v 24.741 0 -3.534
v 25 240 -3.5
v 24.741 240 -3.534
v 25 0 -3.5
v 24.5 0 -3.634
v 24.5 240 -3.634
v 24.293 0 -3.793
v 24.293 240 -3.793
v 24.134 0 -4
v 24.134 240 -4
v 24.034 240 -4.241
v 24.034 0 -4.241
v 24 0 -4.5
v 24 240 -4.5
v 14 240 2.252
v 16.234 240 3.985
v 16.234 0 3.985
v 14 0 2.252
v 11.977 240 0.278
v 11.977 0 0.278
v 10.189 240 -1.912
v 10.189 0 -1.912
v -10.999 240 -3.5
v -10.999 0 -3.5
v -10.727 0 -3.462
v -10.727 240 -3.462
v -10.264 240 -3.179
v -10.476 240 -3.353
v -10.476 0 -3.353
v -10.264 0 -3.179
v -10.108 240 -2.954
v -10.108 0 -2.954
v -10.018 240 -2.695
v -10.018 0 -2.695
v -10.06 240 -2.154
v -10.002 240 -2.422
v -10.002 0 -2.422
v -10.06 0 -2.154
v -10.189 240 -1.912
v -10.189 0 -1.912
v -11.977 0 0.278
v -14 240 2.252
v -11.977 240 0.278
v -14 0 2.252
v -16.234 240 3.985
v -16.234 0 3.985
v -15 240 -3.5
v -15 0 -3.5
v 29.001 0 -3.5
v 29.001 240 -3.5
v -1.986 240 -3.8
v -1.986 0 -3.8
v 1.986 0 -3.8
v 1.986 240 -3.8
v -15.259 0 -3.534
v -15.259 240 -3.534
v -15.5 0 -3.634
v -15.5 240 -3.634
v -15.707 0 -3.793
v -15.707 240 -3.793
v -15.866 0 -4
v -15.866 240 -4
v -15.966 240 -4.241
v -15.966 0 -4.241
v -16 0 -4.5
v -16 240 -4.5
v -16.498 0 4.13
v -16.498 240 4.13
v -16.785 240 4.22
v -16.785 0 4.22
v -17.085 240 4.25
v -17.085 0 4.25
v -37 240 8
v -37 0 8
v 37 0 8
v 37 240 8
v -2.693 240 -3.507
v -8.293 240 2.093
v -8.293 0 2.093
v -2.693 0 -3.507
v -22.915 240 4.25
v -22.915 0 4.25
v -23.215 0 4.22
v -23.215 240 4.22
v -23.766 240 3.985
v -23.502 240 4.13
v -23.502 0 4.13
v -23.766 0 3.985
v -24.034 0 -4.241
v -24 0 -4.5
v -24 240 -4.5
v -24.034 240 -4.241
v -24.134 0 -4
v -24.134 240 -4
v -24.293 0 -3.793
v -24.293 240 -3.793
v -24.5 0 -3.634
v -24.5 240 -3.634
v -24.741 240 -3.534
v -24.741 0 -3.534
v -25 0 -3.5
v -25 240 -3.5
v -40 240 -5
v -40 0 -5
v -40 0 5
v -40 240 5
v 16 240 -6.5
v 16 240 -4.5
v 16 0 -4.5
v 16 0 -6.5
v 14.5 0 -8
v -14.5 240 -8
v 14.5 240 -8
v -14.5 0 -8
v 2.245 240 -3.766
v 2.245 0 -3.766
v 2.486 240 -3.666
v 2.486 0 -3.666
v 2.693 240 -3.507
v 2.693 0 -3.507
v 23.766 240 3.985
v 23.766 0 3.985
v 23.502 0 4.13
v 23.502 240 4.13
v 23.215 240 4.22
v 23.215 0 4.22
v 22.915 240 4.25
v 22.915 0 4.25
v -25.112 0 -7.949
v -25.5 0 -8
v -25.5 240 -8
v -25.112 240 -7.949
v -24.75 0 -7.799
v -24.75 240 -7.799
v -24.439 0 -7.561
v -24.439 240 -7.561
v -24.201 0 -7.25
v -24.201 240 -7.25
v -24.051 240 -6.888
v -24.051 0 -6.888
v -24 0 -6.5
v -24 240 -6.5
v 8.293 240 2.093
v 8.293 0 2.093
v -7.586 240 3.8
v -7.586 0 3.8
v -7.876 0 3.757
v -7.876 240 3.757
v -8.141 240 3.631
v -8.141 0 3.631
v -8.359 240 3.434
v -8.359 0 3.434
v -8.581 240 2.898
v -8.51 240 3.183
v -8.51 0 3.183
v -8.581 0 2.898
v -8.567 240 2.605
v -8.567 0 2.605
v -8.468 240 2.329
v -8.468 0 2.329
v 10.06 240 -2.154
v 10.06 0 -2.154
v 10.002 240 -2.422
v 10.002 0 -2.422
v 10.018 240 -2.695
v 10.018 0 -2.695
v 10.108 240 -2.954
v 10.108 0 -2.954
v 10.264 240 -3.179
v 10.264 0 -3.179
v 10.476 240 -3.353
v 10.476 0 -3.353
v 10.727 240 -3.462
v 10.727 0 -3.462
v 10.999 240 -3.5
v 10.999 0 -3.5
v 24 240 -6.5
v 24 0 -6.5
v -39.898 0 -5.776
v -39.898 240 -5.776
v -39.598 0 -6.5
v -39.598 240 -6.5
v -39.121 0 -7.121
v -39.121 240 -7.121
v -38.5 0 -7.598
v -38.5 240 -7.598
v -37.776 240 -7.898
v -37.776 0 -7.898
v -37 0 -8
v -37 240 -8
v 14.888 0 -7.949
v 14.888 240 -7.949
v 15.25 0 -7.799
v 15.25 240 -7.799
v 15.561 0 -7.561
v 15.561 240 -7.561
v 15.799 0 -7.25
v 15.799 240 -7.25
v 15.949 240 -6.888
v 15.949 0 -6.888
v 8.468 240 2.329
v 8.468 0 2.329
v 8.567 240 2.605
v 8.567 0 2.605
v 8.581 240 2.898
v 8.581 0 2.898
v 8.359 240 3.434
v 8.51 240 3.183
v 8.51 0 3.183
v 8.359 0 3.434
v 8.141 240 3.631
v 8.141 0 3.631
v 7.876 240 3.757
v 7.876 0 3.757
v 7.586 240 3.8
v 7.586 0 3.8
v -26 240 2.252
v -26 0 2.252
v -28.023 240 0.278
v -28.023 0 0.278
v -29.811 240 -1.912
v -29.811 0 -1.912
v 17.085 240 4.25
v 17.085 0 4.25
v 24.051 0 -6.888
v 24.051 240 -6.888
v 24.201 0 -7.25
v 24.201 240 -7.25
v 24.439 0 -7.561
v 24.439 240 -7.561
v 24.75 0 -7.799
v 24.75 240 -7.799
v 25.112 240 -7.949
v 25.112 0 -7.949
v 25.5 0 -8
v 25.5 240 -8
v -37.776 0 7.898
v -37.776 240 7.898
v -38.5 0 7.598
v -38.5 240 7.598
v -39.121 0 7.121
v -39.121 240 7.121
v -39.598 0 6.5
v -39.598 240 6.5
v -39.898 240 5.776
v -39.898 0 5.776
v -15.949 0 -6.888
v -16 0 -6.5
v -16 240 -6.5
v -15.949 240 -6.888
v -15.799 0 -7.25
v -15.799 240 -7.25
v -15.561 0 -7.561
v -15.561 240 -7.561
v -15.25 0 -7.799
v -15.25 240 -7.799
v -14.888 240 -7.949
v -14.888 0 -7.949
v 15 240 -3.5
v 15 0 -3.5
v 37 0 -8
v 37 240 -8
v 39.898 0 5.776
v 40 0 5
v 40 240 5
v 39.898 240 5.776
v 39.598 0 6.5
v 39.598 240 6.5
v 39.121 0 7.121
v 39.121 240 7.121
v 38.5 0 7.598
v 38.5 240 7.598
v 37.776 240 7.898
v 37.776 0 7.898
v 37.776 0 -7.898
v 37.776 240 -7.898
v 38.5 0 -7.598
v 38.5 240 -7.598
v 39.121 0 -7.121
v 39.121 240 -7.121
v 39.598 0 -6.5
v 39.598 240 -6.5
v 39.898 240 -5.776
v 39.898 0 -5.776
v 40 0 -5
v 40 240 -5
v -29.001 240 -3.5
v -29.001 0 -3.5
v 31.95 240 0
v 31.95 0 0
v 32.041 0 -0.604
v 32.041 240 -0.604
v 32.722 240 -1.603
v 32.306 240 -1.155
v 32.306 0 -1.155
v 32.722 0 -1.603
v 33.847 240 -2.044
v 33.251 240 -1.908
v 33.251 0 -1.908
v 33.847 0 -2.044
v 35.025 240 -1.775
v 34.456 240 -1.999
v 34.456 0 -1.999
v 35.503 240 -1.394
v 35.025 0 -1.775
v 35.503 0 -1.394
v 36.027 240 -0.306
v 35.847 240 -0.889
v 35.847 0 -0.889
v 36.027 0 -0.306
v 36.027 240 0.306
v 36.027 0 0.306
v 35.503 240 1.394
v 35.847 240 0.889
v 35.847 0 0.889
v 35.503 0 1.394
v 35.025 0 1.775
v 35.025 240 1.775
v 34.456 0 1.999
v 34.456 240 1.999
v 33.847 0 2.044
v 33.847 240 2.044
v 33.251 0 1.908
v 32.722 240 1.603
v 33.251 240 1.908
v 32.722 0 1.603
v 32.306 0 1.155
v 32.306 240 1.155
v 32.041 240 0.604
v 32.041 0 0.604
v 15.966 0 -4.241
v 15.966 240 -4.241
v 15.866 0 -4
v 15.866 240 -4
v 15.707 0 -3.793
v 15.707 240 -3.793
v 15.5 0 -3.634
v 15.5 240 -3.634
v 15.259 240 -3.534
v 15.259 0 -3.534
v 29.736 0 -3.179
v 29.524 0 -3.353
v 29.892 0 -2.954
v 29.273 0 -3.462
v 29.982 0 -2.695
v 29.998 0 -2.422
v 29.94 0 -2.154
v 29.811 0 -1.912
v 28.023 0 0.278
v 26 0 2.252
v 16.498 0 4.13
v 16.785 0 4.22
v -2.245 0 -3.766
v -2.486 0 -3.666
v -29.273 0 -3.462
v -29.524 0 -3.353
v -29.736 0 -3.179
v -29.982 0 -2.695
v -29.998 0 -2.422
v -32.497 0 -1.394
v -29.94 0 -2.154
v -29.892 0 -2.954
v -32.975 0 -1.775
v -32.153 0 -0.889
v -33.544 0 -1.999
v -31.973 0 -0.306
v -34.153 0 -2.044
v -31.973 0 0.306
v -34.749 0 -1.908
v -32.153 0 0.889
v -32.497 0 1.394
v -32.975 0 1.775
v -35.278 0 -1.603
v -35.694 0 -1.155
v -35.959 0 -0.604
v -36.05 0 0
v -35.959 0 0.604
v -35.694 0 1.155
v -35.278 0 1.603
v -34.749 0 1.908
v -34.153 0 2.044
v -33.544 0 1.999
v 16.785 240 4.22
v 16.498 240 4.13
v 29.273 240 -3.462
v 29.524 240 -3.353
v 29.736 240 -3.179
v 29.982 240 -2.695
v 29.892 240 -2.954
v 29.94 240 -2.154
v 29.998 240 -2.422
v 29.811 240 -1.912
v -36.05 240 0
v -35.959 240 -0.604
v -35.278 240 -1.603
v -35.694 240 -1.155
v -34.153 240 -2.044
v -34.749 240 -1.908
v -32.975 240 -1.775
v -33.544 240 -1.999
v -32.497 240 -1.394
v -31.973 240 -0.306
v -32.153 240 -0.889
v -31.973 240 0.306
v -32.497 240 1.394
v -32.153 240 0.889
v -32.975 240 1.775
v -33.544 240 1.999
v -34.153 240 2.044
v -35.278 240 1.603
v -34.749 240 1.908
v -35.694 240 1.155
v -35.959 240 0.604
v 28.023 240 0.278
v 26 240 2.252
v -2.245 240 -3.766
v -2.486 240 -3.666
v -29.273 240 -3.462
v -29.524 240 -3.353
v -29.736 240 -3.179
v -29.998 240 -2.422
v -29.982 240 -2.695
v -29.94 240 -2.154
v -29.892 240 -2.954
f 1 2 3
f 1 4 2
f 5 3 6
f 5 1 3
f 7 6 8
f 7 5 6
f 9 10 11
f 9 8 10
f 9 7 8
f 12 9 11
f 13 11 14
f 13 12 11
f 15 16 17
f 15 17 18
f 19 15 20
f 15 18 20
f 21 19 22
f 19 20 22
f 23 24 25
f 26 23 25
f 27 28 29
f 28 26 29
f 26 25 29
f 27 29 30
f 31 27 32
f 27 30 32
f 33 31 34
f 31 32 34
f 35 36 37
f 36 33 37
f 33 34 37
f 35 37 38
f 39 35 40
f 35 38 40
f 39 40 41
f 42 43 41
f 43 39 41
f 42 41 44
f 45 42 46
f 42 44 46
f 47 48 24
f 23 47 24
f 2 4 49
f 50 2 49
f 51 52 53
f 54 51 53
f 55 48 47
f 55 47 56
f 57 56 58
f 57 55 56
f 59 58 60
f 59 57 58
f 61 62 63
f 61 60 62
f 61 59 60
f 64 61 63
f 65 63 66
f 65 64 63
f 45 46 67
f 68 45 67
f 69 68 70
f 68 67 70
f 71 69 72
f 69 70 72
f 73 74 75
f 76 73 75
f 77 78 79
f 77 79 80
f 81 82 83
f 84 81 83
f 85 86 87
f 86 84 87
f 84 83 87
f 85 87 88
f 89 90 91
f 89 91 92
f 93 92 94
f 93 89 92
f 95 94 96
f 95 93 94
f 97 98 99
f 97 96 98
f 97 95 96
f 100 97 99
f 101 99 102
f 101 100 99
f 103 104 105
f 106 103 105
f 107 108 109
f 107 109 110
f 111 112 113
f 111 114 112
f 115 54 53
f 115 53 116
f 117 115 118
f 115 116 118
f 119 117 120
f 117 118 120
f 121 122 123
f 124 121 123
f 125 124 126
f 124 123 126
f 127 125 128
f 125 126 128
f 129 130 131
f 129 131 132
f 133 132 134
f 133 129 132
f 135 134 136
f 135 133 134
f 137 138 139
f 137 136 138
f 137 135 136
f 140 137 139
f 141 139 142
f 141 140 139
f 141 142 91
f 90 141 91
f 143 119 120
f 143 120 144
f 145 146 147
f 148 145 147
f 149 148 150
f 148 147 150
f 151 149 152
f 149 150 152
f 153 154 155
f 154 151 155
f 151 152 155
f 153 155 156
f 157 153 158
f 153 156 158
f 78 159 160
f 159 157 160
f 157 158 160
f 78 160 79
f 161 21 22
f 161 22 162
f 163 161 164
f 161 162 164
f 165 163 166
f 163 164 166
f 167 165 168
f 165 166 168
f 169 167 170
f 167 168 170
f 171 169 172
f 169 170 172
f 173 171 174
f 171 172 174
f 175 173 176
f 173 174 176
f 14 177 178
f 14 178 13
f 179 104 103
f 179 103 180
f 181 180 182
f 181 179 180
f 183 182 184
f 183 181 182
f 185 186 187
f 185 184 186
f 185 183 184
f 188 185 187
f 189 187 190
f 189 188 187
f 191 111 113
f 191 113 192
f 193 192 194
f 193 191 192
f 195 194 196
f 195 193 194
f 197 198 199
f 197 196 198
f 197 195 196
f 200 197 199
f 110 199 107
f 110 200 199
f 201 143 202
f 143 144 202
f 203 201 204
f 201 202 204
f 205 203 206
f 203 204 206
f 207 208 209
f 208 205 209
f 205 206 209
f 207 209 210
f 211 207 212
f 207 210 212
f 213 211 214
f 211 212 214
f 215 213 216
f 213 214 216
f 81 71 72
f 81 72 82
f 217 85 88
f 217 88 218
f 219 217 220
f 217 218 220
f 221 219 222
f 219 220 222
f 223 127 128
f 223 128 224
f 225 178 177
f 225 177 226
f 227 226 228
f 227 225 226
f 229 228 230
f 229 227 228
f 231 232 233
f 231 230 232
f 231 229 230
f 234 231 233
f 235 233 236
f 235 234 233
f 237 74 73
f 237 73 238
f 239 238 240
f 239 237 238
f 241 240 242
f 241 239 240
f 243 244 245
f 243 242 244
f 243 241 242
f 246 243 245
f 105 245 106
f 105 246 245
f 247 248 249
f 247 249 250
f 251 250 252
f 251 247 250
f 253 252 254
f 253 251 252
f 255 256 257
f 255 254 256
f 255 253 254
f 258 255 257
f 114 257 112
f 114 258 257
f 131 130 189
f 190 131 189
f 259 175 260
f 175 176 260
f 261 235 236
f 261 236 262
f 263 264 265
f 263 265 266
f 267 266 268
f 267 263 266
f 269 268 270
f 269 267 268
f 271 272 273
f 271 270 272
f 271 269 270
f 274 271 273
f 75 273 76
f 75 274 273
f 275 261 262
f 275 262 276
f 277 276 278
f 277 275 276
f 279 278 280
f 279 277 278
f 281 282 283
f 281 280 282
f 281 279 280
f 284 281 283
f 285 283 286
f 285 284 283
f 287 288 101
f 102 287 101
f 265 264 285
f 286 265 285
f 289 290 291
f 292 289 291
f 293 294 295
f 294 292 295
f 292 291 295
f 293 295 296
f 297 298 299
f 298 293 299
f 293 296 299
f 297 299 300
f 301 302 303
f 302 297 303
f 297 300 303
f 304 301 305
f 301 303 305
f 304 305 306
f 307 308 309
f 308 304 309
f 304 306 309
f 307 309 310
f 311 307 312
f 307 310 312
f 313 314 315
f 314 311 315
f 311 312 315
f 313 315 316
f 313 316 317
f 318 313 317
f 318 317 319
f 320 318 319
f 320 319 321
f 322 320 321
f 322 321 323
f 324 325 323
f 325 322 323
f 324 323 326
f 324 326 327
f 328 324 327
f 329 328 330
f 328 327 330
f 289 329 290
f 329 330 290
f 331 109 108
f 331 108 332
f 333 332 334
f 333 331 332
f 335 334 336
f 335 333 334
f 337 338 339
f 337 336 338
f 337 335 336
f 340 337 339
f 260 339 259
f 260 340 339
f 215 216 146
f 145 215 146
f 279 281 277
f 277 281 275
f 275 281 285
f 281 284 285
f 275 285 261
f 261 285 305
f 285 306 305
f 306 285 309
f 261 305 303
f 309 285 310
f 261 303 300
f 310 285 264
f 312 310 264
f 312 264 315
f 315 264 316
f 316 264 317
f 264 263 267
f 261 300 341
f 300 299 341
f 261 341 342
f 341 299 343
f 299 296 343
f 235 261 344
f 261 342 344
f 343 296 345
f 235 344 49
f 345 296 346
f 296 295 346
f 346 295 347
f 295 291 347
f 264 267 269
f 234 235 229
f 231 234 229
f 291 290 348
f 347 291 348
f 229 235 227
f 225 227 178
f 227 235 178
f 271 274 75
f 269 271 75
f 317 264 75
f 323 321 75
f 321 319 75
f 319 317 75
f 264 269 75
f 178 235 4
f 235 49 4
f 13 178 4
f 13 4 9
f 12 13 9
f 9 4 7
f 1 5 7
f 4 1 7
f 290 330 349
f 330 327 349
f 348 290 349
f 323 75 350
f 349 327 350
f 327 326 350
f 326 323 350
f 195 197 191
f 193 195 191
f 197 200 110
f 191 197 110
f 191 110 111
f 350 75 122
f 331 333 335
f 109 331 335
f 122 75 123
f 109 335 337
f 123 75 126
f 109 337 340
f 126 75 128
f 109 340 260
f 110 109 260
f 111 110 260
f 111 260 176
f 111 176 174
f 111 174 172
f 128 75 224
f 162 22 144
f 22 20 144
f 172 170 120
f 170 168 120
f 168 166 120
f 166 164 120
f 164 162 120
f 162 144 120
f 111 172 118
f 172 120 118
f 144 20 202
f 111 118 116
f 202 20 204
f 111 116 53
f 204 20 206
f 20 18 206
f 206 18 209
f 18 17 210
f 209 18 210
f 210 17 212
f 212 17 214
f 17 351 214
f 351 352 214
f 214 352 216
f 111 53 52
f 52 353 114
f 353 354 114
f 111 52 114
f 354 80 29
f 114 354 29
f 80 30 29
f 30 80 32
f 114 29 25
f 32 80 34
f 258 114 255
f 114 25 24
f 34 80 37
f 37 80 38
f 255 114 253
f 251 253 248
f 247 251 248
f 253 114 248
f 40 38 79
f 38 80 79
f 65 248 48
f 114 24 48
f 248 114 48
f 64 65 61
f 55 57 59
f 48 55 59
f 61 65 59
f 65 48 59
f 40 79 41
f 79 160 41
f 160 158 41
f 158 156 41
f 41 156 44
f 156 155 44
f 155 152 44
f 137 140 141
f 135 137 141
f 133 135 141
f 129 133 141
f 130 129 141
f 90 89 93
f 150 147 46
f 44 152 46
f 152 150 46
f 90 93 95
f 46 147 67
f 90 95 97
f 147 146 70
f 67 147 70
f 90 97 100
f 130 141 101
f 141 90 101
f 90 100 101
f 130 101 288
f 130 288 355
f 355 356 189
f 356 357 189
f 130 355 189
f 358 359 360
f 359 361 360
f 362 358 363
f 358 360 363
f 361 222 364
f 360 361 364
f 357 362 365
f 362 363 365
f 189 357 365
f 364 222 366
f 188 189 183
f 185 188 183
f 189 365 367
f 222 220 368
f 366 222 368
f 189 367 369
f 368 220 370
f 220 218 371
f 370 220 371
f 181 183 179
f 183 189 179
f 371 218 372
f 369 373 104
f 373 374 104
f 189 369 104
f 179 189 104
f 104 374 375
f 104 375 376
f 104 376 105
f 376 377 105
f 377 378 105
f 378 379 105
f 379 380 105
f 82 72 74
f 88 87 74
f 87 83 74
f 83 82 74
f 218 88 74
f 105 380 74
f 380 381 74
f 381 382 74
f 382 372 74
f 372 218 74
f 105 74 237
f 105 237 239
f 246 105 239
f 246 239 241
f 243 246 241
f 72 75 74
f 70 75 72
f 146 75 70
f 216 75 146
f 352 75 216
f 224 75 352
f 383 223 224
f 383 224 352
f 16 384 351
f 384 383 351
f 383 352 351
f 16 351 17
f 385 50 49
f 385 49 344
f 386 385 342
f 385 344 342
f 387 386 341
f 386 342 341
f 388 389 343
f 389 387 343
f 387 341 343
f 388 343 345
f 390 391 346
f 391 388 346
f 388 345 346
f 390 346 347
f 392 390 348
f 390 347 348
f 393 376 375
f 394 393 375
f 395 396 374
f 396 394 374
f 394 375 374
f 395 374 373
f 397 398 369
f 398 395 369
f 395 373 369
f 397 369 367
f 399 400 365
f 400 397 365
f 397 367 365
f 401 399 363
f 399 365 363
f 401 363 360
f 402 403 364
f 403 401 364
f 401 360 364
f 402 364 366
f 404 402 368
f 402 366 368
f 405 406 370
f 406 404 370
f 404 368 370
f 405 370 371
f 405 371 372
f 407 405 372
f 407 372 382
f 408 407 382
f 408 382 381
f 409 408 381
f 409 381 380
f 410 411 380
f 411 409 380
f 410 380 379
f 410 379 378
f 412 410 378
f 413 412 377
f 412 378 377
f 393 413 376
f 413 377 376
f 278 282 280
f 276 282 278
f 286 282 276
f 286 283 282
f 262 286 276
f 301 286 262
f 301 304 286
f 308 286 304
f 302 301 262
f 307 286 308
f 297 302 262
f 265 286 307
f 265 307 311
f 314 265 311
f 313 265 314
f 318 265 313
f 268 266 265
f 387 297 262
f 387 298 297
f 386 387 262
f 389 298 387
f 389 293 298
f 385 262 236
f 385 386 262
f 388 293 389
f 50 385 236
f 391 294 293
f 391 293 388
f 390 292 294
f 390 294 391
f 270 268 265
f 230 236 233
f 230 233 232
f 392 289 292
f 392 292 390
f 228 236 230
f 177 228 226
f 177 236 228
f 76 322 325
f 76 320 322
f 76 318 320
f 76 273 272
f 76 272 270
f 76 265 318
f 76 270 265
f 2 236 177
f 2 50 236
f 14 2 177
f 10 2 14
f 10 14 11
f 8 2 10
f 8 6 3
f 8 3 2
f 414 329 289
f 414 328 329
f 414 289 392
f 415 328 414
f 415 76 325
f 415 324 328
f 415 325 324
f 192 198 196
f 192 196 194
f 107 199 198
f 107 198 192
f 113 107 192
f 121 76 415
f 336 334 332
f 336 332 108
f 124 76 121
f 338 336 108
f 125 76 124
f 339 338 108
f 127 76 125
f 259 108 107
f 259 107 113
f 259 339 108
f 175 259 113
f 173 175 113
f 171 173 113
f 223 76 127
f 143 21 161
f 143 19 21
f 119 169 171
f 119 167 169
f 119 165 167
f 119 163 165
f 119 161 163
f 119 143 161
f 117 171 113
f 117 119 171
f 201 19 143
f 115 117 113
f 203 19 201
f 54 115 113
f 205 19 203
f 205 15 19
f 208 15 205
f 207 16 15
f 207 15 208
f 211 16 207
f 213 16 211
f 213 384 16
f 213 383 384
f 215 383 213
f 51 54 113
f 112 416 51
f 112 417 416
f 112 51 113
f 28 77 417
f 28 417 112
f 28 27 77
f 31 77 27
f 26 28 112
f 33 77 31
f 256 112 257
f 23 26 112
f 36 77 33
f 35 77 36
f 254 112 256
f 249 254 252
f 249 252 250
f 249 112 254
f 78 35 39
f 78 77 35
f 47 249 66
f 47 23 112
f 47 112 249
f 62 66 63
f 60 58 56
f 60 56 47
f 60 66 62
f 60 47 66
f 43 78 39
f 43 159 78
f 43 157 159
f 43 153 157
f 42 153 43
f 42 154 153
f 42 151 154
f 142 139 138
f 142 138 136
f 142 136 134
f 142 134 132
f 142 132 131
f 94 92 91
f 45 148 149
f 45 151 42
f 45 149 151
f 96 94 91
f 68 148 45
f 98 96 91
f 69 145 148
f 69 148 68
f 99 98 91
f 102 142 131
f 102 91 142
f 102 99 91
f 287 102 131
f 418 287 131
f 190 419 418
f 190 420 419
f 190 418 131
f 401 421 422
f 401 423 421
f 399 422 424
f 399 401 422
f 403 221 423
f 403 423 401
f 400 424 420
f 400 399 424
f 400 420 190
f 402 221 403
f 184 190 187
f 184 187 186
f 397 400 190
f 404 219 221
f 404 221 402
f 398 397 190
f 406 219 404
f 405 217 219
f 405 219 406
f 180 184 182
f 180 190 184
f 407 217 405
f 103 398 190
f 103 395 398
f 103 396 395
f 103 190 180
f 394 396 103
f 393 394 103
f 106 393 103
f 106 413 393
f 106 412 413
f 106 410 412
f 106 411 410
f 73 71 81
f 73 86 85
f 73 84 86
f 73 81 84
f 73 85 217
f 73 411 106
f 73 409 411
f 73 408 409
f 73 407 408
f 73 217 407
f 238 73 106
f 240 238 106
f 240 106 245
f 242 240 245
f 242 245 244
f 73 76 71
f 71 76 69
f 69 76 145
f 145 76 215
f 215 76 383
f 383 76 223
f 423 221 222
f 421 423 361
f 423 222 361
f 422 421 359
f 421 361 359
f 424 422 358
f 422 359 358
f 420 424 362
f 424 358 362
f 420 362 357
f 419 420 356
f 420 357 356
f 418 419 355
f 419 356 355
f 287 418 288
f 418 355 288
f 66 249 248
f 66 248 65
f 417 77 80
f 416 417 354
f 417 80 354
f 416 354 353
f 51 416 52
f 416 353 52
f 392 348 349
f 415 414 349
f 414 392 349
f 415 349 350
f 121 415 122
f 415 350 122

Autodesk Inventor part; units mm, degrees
ref_plane "YZ Plane" through (0, 0, 0) normal (1, 0, 0) x (0, 1, 0)
ref_plane "Start Plane" through (0, 0, 0) normal (0, 1, 0) x (-1, 0, 0)
ref_plane "End Plane" through (0, 240, 0) normal (0, 1, 0) x (-1, 0, 0)
sketch "Sketch1" plane through (0, 0, 0) normal (0, 1, 0) x (-1, 0, 0)
  line L0 (40, -5) -> (40, 5)
  arc A0 (40, 5) -> (37, 8) centre (37, 5) ccw
  line L1 (37, 8) -> (-37, 8)
  line L2 (14.5, -8) -> (-14.5, -8)
  arc A1 (14.5, -8) -> (16, -6.5) centre (14.5, -6.5) ccw
  line L3 (-25.5, -8) -> (-37, -8)
  arc A2 (-25.5, -8) -> (-24, -6.5) centre (-25.5, -6.5) ccw
  arc A3 (-37, 8) -> (-40, 5) centre (-37, 5) ccw
  line L4 (-40, 5) -> (-40, -5)
  arc A4 (-40, -5) -> (-37, -8) centre (-37, -5) ccw
  line L5 (-24, -6.5) -> (-24, -4.5)
  arc A5 (-24, -4.5) -> (-25, -3.5) centre (-25, -4.5) ccw
  line L6 (-25, -3.5) -> (-29.0014, -3.5)
  arc A6 (-29.8106, -1.9125) -> (-29.0014, -3.5) centre (-29.0014, -2.5) ccw
  arc A7 (-23.7664, 3.9851) -> (-29.8106, -1.9125) centre (-9.58, -16.6) ccw
  arc A8 (-22.9152, 4.25) -> (-23.7664, 3.9851) centre (-22.9152, 2.75) ccw
  line L7 (-22.9152, 4.25) -> (-17.0848, 4.25)
  arc A9 (-16.2336, 3.9851) -> (-17.0848, 4.25) centre (-17.0848, 2.75) ccw
  arc A10 (-10.1894, -1.9125) -> (-16.2336, 3.9851) centre (-30.42, -16.6) ccw
  arc A11 (-10.9986, -3.5) -> (-10.1894, -1.9125) centre (-10.9986, -2.5) ccw
  line L8 (-10.9986, -3.5) -> (-15, -3.5)
  arc A12 (-15, -3.5) -> (-16, -4.5) centre (-15, -4.5) ccw
  line L9 (-16, -4.5) -> (-16, -6.5)
  arc A13 (-16, -6.5) -> (-14.5, -8) centre (-14.5, -6.5) ccw
  line L10 (16, -6.5) -> (16, -4.5)
  arc A14 (16, -4.5) -> (15, -3.5) centre (15, -4.5) ccw
  line L11 (15, -3.5) -> (10.9986, -3.5)
  arc A15 (10.1894, -1.9125) -> (10.9986, -3.5) centre (10.9986, -2.5) ccw
  arc A16 (16.2336, 3.9851) -> (10.1894, -1.9125) centre (30.42, -16.6) ccw
  arc A17 (17.0848, 4.25) -> (16.2336, 3.9851) centre (17.0848, 2.75) ccw
  line L12 (17.0848, 4.25) -> (22.9152, 4.25)
  arc A18 (23.7664, 3.9851) -> (22.9152, 4.25) centre (22.9152, 2.75) ccw
  arc A19 (29.8106, -1.9125) -> (23.7664, 3.9851) centre (9.58, -16.6) ccw
  arc A20 (29.0014, -3.5) -> (29.8106, -1.9125) centre (29.0014, -2.5) ccw
  line L13 (29.0014, -3.5) -> (25, -3.5)
  arc A21 (25, -3.5) -> (24, -4.5) centre (25, -4.5) ccw
  line L14 (1.9858, -3.8) -> (-1.9858, -3.8)
  arc A22 (-2.6929, -3.5071) -> (-1.9858, -3.8) centre (-1.9858, -2.8) ccw
  line L15 (-2.6929, -3.5071) -> (-8.2929, 2.0929)
  arc A23 (-7.5858, 3.8) -> (-8.2929, 2.0929) centre (-7.5858, 2.8) ccw
  line L16 (-7.5858, 3.8) -> (7.5858, 3.8)
  arc A24 (8.2929, 2.0929) -> (7.5858, 3.8) centre (7.5858, 2.8) ccw
  line L17 (8.2929, 2.0929) -> (2.6929, -3.5071)
  arc A25 (1.9858, -3.8) -> (2.6929, -3.5071) centre (1.9858, -2.8) ccw
  circle A26 centre (-34, 0) radius 2.05
  circle A27 centre (34, 0) radius 2.05
  line L18 (25.5, -8) -> (37, -8)
  arc A28 (24, -6.5) -> (25.5, -8) centre (25.5, -6.5) ccw
  arc A29 (37, -8) -> (40, -5) centre (37, -5) ccw
  line L19 (24, -6.5) -> (24, -4.5)
  point P0 (0, 0)
extrude "Body" add sketch "Sketch1" along normal up to surface (240 mm away) from surface at 0
sketch "Sketch2" plane through (0, 0, 0) normal (0, 1, 0) x (-1, 0, 0)
  line L0 (0, 0) -> (10, 0)
ref_plane "Work Plane3" through (0, 0, 0) normal (0, 0, -1) x (-1, 0, 0)
sketch "Sketch3" plane through (0, 0, 0) normal (0, 0, -1) x (-1, 0, 0)
  line L0 (-2, 0) -> (12, 0)
  line L1 (-2, 240) -> (12, 240)
  dimension "d15" = 240
sketch "Schizzo4" plane through (22.9152, 240, 4.25) normal (0, 0, -1) x (-1, 0, 0)
  point P0 (22.9152, -240)
equation "\"G_OFFSET_START\" = 0"
equation "\"G_OFFSET_END\" = 0"
equation "\"G_L\" = d15"
properties part number "10-081"
